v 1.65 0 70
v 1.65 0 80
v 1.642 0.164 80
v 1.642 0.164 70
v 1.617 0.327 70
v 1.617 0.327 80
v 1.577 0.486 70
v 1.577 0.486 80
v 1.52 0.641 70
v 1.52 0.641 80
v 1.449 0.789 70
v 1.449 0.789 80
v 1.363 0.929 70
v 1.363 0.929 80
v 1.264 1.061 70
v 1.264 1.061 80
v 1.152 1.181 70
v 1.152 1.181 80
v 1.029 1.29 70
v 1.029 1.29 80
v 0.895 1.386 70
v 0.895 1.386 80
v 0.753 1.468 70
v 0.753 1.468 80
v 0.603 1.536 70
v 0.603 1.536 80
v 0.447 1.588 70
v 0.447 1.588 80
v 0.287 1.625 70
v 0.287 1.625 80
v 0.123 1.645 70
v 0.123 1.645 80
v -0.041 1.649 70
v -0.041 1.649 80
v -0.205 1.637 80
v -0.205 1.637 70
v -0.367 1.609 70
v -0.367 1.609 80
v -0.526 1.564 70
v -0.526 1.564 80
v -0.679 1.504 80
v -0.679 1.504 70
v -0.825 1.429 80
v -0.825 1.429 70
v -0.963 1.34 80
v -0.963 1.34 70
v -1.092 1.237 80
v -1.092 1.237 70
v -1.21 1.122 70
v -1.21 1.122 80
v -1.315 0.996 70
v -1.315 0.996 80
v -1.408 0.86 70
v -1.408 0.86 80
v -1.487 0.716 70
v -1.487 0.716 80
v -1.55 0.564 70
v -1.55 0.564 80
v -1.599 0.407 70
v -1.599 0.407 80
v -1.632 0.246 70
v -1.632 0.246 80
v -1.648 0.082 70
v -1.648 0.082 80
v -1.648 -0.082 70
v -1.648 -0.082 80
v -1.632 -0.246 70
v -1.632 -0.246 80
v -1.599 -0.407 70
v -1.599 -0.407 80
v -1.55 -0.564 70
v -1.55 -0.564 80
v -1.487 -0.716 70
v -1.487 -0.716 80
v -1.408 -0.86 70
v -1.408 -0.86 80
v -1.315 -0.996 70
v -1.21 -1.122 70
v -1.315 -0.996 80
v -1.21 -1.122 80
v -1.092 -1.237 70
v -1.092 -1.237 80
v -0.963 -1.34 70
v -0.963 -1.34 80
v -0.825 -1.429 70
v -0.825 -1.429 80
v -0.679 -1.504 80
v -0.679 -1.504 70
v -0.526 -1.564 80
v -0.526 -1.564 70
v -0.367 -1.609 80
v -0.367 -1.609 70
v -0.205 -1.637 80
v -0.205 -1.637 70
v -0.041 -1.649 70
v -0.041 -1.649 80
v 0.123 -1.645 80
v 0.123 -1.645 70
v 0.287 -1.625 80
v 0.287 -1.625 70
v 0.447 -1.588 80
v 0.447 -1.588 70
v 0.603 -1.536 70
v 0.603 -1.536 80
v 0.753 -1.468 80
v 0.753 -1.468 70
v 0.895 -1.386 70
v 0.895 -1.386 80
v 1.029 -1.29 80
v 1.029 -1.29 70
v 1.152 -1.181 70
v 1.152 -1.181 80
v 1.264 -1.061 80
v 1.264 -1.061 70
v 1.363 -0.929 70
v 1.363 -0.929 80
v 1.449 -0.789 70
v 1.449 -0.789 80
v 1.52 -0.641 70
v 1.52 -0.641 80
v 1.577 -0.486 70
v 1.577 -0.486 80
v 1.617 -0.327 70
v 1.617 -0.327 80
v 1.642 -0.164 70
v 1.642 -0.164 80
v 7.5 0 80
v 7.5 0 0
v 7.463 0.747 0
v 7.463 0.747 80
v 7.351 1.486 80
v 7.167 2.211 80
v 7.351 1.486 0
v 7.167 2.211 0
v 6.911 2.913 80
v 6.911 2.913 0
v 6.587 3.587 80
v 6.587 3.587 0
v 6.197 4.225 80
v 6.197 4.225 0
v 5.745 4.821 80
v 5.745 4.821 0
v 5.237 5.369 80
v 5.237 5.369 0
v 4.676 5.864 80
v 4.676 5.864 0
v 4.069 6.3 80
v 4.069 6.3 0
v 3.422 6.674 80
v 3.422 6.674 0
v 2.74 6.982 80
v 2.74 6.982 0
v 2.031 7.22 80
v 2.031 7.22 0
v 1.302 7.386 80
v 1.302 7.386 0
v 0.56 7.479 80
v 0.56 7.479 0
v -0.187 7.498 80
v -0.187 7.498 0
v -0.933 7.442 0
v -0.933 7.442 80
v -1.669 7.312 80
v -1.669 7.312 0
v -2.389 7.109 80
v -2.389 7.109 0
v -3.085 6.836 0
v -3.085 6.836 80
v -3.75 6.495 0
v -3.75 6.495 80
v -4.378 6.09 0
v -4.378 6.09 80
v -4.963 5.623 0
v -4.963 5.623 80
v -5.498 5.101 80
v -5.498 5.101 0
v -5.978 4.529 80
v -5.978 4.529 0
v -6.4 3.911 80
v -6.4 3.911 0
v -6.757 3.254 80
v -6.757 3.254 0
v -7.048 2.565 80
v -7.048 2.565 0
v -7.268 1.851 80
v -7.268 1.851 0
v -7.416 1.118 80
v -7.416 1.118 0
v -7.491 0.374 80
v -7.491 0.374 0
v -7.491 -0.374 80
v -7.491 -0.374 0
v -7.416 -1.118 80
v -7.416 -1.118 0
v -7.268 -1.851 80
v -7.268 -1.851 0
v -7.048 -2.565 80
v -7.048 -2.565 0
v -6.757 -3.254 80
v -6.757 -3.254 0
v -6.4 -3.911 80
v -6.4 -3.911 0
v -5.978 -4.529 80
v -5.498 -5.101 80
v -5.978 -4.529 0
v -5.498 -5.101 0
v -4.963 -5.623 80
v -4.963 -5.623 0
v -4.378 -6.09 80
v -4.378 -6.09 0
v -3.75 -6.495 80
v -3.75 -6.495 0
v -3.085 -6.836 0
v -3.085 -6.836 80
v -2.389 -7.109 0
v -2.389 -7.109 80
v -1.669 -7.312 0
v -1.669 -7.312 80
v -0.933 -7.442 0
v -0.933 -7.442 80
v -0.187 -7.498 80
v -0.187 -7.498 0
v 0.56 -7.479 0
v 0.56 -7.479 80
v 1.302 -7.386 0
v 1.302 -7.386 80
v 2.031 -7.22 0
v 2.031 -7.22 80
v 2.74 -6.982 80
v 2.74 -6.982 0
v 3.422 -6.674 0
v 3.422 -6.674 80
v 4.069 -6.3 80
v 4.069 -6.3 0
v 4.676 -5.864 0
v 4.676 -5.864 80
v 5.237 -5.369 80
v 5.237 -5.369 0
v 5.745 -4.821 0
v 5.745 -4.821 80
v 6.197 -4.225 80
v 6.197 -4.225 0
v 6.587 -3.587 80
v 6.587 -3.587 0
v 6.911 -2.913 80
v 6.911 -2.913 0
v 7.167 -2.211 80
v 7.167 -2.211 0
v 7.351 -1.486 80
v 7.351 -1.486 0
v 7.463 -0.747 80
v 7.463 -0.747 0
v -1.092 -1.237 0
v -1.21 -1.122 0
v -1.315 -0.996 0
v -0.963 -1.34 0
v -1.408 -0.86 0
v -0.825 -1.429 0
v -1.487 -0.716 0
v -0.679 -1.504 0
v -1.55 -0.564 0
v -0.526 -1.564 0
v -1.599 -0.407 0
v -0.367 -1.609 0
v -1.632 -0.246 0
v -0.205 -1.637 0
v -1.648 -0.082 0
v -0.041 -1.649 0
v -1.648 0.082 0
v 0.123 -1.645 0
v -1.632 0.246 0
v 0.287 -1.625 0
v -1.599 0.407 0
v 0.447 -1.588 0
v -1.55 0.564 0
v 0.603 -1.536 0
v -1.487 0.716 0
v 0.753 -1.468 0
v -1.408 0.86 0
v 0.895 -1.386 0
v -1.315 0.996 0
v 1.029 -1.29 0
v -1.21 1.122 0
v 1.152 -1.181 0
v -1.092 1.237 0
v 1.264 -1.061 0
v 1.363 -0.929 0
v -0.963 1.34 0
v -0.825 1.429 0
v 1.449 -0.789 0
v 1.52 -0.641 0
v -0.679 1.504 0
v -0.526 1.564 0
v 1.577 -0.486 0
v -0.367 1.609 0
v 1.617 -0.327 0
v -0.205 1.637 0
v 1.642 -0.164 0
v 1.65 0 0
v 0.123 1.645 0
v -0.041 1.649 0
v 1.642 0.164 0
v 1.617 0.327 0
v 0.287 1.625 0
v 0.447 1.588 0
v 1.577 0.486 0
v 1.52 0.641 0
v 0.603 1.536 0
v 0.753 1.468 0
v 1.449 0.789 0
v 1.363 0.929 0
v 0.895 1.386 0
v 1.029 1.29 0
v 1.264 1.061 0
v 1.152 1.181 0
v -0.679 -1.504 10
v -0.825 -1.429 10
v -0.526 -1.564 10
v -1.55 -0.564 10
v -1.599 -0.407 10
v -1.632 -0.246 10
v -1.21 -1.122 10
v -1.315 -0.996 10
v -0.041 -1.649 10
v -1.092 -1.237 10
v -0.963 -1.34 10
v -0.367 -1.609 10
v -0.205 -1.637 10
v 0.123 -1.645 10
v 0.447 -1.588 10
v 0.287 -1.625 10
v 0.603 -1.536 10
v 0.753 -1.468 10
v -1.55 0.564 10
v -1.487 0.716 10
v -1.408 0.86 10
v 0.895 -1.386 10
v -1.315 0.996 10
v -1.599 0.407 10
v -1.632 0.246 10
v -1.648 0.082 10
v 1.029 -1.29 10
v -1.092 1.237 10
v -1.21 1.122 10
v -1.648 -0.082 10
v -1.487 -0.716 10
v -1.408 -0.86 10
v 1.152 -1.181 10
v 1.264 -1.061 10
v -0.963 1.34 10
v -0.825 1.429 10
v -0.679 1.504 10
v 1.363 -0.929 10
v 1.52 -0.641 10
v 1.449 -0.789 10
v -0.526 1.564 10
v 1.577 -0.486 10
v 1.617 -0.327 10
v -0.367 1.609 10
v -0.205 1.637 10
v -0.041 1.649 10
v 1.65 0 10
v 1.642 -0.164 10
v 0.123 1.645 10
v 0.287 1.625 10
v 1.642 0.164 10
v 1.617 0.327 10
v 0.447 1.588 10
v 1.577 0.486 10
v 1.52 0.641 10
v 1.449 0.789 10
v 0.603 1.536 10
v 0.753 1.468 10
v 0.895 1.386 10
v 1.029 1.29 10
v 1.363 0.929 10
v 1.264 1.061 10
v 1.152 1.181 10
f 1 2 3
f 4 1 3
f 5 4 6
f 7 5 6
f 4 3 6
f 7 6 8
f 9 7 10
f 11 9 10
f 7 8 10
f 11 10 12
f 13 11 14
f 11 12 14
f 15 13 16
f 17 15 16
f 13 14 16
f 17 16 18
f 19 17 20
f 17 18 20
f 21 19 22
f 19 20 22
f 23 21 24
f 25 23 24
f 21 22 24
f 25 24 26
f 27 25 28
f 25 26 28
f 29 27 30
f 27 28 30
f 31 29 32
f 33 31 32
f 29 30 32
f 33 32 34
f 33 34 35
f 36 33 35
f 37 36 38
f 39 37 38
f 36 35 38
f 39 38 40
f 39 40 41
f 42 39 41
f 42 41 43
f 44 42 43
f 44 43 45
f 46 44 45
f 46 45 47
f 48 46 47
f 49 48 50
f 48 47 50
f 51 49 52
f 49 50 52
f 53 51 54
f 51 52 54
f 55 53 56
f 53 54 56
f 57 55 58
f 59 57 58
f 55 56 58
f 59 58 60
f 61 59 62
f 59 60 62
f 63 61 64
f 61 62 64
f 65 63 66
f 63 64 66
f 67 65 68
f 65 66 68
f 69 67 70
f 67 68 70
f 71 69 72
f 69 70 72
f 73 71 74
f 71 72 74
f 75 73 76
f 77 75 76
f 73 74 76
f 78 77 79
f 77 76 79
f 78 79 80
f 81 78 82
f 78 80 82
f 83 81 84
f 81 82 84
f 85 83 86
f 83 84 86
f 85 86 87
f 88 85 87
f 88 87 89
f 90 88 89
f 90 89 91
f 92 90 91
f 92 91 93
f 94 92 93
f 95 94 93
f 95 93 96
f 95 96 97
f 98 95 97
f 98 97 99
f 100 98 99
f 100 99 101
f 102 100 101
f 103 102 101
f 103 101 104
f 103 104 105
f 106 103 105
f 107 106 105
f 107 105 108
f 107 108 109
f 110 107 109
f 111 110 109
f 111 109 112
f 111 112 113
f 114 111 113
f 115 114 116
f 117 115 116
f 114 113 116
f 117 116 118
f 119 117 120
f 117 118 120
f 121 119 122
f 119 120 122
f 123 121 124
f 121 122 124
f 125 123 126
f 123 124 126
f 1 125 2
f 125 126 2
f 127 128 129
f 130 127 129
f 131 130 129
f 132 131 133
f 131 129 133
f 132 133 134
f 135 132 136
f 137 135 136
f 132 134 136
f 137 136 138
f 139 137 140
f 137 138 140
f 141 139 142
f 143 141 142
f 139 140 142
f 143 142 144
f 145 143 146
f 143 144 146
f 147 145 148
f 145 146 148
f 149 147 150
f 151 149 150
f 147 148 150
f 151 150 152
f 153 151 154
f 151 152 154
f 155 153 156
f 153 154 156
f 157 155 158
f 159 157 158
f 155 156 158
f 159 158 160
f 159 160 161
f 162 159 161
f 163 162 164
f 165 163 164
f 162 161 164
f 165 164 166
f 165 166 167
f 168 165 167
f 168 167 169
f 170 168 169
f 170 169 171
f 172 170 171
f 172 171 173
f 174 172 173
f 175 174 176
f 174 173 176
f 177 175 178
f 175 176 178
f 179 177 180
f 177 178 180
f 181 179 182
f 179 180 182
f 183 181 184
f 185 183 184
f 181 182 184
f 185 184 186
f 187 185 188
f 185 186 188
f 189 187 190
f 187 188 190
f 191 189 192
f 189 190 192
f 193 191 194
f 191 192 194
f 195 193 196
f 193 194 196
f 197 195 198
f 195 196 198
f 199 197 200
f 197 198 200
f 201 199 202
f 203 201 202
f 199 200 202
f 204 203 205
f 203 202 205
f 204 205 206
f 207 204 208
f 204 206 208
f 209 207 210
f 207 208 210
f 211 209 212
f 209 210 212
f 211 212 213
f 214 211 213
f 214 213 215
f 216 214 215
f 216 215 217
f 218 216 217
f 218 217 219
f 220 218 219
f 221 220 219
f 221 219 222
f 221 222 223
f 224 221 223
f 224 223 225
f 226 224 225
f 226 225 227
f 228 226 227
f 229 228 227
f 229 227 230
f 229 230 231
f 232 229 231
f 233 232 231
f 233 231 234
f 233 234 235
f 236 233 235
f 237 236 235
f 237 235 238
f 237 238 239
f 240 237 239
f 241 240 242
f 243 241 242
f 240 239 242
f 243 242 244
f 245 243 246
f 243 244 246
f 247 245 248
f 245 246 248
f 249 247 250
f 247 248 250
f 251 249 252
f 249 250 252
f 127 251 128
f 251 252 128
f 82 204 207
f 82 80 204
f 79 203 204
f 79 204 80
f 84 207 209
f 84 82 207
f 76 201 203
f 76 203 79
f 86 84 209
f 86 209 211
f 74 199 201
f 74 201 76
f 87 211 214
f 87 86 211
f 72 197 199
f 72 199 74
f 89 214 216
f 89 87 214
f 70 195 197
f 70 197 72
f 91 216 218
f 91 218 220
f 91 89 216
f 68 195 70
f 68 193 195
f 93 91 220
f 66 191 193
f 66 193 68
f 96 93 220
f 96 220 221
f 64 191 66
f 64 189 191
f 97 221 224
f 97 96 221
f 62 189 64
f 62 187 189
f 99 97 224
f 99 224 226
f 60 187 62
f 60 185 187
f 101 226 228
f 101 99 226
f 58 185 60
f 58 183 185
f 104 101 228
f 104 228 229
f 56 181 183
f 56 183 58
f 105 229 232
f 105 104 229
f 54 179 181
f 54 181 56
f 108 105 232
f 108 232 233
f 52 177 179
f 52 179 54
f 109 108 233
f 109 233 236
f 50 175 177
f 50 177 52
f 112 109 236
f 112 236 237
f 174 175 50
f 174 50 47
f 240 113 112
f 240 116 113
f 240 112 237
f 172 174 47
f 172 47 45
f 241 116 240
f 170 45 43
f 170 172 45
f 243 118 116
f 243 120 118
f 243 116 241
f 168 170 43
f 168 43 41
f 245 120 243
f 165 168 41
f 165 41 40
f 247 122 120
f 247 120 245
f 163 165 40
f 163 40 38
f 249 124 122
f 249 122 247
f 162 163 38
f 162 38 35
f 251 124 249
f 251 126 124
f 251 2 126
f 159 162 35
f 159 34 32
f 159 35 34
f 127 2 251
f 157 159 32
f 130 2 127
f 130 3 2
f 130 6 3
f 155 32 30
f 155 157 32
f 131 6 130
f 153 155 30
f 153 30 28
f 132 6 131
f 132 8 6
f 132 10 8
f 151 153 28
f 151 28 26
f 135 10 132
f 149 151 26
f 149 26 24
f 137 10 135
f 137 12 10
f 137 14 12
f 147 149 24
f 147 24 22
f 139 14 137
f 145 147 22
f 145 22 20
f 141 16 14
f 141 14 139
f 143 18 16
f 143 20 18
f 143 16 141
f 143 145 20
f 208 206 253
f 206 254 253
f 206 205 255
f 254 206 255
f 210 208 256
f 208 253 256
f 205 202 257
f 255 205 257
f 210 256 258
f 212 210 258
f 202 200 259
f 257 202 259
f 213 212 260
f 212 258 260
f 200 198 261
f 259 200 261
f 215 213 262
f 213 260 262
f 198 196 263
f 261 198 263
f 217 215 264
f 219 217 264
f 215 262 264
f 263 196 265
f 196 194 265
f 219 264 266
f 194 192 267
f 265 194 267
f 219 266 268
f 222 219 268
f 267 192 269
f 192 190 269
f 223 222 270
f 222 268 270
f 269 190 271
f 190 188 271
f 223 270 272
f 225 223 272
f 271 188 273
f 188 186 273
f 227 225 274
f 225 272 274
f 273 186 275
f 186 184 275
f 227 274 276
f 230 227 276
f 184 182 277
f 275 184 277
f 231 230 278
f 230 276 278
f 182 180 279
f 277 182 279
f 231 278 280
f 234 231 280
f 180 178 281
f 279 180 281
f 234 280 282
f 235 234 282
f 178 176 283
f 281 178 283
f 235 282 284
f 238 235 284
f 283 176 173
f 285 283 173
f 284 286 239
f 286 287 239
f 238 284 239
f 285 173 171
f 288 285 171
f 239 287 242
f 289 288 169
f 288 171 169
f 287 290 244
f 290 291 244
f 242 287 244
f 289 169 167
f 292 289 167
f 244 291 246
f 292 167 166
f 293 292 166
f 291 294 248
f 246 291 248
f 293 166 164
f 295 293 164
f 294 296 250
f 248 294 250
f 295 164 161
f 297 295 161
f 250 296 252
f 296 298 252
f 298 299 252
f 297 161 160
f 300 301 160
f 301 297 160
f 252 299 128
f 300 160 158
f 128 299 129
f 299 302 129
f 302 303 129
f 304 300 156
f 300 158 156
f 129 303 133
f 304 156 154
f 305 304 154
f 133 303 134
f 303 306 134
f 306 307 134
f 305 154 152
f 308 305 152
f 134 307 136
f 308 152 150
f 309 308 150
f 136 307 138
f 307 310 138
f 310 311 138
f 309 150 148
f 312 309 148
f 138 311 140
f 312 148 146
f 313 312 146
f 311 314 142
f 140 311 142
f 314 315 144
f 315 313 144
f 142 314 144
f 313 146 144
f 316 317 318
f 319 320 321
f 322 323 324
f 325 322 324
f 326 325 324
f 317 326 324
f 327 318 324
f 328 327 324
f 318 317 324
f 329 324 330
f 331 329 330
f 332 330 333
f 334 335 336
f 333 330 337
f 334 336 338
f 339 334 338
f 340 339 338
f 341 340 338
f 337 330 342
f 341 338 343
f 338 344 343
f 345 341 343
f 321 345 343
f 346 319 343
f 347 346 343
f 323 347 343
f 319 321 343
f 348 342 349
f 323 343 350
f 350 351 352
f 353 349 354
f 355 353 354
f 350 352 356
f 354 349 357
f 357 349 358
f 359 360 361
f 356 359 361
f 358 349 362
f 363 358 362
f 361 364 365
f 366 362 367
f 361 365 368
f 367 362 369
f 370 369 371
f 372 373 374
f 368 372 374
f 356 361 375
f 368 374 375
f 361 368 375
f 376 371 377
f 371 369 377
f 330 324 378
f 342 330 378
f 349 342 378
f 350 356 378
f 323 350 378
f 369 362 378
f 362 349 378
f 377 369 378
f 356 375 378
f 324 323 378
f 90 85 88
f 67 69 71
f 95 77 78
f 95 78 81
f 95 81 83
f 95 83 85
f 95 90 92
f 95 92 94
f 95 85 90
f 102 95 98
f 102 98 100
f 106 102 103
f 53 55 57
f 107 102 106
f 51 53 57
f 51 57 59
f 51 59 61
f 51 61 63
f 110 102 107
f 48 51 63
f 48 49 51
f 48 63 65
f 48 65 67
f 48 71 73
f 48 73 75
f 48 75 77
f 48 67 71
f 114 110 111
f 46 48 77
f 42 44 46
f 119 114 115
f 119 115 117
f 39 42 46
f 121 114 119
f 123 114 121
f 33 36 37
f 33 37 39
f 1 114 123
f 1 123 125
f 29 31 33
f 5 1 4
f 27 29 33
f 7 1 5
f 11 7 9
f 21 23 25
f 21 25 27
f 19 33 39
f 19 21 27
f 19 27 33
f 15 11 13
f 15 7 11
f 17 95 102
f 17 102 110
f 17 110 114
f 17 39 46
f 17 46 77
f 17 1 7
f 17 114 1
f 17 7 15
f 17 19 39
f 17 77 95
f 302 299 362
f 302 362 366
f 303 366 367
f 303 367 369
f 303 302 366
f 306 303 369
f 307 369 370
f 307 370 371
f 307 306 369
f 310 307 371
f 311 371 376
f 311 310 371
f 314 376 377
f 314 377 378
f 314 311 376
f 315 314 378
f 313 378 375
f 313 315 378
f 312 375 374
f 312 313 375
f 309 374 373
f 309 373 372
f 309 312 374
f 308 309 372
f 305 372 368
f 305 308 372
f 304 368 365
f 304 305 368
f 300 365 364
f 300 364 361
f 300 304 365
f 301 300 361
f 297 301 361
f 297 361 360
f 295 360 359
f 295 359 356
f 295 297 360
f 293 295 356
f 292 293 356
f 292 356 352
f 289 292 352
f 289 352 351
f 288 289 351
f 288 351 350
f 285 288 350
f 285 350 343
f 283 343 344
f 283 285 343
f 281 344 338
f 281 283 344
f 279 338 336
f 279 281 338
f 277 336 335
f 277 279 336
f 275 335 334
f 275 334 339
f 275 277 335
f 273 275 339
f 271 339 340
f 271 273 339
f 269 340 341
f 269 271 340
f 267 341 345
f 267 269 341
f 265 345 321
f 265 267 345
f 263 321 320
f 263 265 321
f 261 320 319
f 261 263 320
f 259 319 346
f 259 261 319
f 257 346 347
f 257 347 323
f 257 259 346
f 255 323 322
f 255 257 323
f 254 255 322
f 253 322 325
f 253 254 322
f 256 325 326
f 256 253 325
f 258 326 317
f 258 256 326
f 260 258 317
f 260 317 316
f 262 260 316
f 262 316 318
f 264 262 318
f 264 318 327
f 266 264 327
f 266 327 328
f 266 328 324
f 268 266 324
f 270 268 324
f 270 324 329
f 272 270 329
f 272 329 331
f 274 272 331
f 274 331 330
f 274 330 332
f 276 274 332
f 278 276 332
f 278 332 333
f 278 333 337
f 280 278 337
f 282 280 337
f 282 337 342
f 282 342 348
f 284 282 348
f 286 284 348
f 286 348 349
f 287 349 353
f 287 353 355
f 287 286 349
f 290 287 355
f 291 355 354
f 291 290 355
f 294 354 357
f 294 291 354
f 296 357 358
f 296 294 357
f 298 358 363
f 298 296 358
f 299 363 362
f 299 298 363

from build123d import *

# Parameters (mm, degrees)
SKETCH_1_R          = 7.5
EXTRUDE_1_DEPTH     = 80
SKETCH_2_R          = 1.65
CUT_EXTRUDE_1_DEPTH = 10


with BuildPart() as part:
    # ｽｹｯﾁ1 → ﾎﾞｽ - 押し出し1 (new body)
    with BuildSketch(Plane.XY):
        Circle(SKETCH_1_R)
    extrude(amount=EXTRUDE_1_DEPTH)

    # ｽｹｯﾁ2 → ｶｯﾄ - 押し出し1 (cut)
    with BuildSketch(Plane.XY.offset(80)):
        Circle(SKETCH_2_R)
    cut_extrude_1 = extrude(amount=-CUT_EXTRUDE_1_DEPTH, mode=Mode.SUBTRACT)

    # ﾐﾗｰ1: ｶｯﾄ - 押し出し1 across plane
    add(cut_extrude_1.mirror(Plane.XY.offset(40)), mode=Mode.SUBTRACT)


solid = part.part
